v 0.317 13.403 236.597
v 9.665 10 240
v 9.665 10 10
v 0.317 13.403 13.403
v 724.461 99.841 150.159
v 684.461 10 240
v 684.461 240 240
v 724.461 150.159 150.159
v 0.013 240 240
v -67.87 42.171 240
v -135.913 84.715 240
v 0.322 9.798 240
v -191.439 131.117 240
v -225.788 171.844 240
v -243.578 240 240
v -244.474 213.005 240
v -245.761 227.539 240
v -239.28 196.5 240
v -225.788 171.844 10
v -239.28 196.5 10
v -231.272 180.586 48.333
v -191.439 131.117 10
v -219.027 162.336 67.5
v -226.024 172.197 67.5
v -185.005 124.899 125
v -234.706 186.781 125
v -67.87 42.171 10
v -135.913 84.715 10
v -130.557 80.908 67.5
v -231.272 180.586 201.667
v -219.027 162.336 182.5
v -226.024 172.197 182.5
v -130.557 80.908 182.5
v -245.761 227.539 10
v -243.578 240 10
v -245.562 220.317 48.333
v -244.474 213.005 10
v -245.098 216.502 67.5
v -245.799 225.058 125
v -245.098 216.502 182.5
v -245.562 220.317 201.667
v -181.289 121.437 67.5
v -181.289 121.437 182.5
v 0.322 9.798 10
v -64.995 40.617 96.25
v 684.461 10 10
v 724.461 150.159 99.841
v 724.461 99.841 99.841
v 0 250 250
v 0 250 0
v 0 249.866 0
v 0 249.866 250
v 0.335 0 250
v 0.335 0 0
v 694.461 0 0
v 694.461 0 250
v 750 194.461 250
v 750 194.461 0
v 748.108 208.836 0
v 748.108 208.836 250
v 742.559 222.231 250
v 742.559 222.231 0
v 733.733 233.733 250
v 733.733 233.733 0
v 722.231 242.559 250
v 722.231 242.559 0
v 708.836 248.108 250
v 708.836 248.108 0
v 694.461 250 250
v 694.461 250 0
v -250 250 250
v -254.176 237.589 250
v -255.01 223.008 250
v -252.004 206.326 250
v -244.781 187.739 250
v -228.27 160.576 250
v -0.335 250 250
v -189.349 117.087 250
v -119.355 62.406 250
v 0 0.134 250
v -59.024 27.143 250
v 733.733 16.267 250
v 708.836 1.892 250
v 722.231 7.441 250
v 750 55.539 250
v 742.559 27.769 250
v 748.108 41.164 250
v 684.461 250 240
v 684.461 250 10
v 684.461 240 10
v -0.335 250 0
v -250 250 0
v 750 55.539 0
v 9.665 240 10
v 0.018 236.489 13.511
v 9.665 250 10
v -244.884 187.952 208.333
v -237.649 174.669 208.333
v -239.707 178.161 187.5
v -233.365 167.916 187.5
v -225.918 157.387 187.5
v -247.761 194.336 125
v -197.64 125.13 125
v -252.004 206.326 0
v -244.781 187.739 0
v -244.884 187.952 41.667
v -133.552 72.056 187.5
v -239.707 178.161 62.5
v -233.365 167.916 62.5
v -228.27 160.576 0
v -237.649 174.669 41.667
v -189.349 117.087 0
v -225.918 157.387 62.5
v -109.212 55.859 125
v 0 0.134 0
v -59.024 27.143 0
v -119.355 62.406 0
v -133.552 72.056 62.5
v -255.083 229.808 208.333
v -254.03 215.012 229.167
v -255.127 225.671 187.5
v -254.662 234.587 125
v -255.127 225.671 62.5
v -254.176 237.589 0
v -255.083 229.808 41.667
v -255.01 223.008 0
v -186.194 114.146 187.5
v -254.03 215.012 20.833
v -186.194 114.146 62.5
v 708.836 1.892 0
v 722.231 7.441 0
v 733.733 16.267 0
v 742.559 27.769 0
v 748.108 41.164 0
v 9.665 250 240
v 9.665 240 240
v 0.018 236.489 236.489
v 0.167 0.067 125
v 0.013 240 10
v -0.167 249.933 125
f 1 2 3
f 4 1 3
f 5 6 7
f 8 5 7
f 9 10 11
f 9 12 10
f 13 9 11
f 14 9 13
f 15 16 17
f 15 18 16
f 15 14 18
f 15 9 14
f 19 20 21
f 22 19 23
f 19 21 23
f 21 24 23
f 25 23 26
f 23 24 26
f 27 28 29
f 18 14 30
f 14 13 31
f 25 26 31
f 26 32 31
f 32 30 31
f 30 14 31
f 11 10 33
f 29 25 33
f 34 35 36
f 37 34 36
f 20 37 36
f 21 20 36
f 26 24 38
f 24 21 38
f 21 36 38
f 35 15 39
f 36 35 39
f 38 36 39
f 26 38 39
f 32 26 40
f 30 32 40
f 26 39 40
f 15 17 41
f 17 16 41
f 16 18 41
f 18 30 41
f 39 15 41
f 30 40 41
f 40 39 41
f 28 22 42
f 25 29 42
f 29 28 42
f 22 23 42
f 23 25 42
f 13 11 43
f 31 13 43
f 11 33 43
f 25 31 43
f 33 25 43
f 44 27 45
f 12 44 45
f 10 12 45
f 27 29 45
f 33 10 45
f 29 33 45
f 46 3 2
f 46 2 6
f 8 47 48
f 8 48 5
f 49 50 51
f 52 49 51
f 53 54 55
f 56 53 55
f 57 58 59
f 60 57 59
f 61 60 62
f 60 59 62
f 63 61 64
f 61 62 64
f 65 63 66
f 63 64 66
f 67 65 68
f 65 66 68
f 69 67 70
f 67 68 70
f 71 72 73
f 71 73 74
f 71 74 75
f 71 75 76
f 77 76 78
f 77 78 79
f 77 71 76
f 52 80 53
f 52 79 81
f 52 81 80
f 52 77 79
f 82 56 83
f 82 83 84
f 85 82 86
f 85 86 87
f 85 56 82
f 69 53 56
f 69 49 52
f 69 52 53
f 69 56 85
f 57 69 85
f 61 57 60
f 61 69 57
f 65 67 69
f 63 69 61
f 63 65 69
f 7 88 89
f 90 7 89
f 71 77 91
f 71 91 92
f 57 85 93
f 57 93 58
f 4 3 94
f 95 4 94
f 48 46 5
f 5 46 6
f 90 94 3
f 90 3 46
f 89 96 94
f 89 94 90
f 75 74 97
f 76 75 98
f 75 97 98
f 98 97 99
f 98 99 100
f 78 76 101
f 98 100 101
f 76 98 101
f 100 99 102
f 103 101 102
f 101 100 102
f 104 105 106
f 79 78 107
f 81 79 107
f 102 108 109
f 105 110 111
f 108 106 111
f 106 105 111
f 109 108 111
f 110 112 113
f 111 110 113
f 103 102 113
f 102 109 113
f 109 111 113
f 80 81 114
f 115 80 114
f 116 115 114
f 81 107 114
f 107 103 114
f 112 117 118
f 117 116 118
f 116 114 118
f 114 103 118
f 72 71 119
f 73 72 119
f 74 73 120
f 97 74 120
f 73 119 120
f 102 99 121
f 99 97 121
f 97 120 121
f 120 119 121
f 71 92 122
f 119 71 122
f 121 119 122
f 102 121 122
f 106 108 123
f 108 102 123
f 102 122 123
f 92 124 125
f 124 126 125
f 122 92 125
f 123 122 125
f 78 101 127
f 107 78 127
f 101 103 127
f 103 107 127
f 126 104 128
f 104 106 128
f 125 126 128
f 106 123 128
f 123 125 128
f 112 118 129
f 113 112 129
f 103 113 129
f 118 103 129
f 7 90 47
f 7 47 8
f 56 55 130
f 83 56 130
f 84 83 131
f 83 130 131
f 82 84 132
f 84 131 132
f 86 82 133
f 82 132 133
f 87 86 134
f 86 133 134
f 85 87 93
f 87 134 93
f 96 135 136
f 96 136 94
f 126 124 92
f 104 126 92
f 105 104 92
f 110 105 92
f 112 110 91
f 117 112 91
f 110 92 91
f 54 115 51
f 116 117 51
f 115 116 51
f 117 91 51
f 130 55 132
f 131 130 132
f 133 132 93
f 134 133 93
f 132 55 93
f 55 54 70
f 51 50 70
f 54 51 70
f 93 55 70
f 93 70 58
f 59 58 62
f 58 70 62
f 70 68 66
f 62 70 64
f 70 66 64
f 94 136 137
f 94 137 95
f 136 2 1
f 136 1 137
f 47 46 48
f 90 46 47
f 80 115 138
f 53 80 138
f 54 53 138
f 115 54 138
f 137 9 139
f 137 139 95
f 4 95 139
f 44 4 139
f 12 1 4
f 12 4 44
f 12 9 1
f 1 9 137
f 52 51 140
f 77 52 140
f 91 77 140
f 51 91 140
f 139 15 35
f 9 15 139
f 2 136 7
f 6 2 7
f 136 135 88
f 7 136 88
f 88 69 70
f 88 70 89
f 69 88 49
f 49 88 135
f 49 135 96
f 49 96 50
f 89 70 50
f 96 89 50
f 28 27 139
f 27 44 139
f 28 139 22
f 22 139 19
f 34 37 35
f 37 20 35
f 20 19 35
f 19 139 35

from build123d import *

# Parameters (mm, degrees)
BOSS_EXTRU_1_DEPTH      = 250
ESQUISSE2_W             = 674.796104683
ESQUISSE2_H             = 230
ENL_V_MAT_EXTRU_1_DEPTH = 240
ESQUISSE3_W             = 230
ESQUISSE3_H             = 230
ENL_V_MAT_EXTRU_2_DEPTH = 40
ENL_V_MAT_EXTRU_2_DRAFT = -66
ENL_V_START             = -10
ENL_V_MAT_EXTRU_6_DEPTH = 230
ESQUISSE7_W             = 230
ESQUISSE7_H             = 230
ENL_V_MAT_EXTRU_7_DEPTH = 20
ENL_V_MAT_EXTRU_7_DRAFT = -20


with BuildPart() as part:
    # Esquisse1 → Boss.-Extru.1 (new body)
    with BuildSketch(Plane.XY):
        with BuildLine():
            add(Edge.make_bspline(
                [(0, 0.133886157), (0.167402546, 0.066889297), (0.334804949, 0)],
                knots=[1.771746973, 1.771746973, 1.771746973, 1.773247838, 1.773247838, 1.773247838], degree=2, weights=[0.999377636, 0.999688554, 1]))
            Line((0.334804949, 0), (694.461299734, 0))
            ThreePointArc((694.461299734, 0), (733.73309131, 16.26690869), (750, 55.538700266))
            Line((750, 55.538700266), (750, 194.461299734))
            ThreePointArc((750, 194.461299734), (733.73309131, 233.73309131), (694.461299734, 250))
            Line((694.461299734, 250), (0, 250))
            Line((0, 250), (0, 249.866113843))
            add(Edge.make_bspline(
                [(0, 249.866113843), (-0.167402546, 249.933110703), (-0.334804949, 250)],
                knots=[4.913528271, 4.913528271, 4.913528271, 4.914840492, 4.914840492, 4.914840492], degree=2, weights=[1, 0.999999785, 1]))
            Line((-0.334804949, 250), (-250, 250))
            add(Edge.make_bspline(
                [(-250, 250), (-312.416343553, 125.167312895), (0, 0.133886157)],
                knots=[0, 0, 0, 1.771746973, 1.771746973, 1.771746973], degree=2, weights=[1, 0.632343338, 0.999377636]))
        make_face()
    extrude(amount=BOSS_EXTRU_1_DEPTH)

    # Esquisse2 → Enlèv. mat.-Extru.1 (cut)
    with BuildSketch(Plane(origin=(0, 250, 0), x_dir=(1, 0, 0), z_dir=(0, 1, 0))):
        with Locations((347.063247392, -125)):
            Rectangle(ESQUISSE2_W, ESQUISSE2_H)
    extrude(amount=-ENL_V_MAT_EXTRU_1_DEPTH, mode=Mode.SUBTRACT)


with BuildPart() as enl_v_mat_extru_2_tool:
    # Esquisse3 → Enlèv. mat.-Extru.2 (with draft: the straight prism first)
    with BuildSketch(Plane.ZY.offset(-684.461299734)):
        with Locations((125, 125)):
            Rectangle(ESQUISSE3_W, ESQUISSE3_H)
    extrude(amount=-ENL_V_MAT_EXTRU_2_DEPTH)
    # Enlèv. mat.-Extru.2: the draft: its side faces are tilted about the plane it starts from
    enl_v_mat_extru_2_sides = [enl_v_mat_extru_2_tool.faces().sort_by_distance(p)[0] for p in [
        (704.461299734, 125, 10),
        (704.461299734, 10, 125),
        (704.461299734, 125, 240),
        (704.461299734, 240, 125),
    ]]
    draft(enl_v_mat_extru_2_sides, Plane.ZY.offset(-684.461299734), ENL_V_MAT_EXTRU_2_DRAFT)


with BuildPart() as part_1:
    add(part.part)

    # Enlèv. mat.-Extru.2: cut by enl_v_mat_extru_2_tool
    add(enl_v_mat_extru_2_tool.part, mode=Mode.SUBTRACT)

    # Esquisse5 → Enlèv. mat.-Extru.6 (cut)
    with BuildSketch(Plane.XY.offset(250).offset(ENL_V_START)):
        with BuildLine():
            Line((0.013392186, 240.000008968), (0.321682976, 9.798221826))
            add(Edge.make_bspline(
                [(-243.578112703, 240.000000104), (-281.360738576, 124.899105152), (0.321682976, 9.798221826)],
                knots=[0.057124258, 0.057124258, 0.057124258, 1.763084739, 1.763084739, 1.763084739], degree=2, weights=[1, 0.657741222, 1]))
            Line((-243.578112703, 240.000000104), (0.013392186, 240.000008968))
        make_face()
    extrude(amount=-ENL_V_MAT_EXTRU_6_DEPTH, mode=Mode.SUBTRACT)


with BuildPart() as enl_v_mat_extru_7_tool:
    # Esquisse7 → Enlèv. mat.-Extru.7 (with draft: the straight prism first)
    with BuildSketch(Plane(origin=(9.665195051, 0, 0), x_dir=(0, 0, -1), z_dir=(1, 0, 0))):
        with Locations((-125, 125)):
            Rectangle(ESQUISSE7_W, ESQUISSE7_H)
    extrude(amount=-ENL_V_MAT_EXTRU_7_DEPTH)
    # Enlèv. mat.-Extru.7: the draft: its side faces are tilted about the plane it starts from
    enl_v_mat_extru_7_sides = [enl_v_mat_extru_7_tool.faces().sort_by_distance(p)[0] for p in [
        (-0.334804949, 125, 10),
        (-0.334804949, 240, 125),
        (-0.334804949, 125, 240),
        (-0.334804949, 10, 125),
    ]]
    draft(enl_v_mat_extru_7_sides, Plane(origin=(9.665195051, 0, 0), x_dir=(0, 0, -1), z_dir=(1, 0, 0)), ENL_V_MAT_EXTRU_7_DRAFT)


with BuildPart() as part_2:
    add(part_1.part)

    # Enlèv. mat.-Extru.7: cut by enl_v_mat_extru_7_tool
    add(enl_v_mat_extru_7_tool.part, mode=Mode.SUBTRACT)


solid = part_2.part
